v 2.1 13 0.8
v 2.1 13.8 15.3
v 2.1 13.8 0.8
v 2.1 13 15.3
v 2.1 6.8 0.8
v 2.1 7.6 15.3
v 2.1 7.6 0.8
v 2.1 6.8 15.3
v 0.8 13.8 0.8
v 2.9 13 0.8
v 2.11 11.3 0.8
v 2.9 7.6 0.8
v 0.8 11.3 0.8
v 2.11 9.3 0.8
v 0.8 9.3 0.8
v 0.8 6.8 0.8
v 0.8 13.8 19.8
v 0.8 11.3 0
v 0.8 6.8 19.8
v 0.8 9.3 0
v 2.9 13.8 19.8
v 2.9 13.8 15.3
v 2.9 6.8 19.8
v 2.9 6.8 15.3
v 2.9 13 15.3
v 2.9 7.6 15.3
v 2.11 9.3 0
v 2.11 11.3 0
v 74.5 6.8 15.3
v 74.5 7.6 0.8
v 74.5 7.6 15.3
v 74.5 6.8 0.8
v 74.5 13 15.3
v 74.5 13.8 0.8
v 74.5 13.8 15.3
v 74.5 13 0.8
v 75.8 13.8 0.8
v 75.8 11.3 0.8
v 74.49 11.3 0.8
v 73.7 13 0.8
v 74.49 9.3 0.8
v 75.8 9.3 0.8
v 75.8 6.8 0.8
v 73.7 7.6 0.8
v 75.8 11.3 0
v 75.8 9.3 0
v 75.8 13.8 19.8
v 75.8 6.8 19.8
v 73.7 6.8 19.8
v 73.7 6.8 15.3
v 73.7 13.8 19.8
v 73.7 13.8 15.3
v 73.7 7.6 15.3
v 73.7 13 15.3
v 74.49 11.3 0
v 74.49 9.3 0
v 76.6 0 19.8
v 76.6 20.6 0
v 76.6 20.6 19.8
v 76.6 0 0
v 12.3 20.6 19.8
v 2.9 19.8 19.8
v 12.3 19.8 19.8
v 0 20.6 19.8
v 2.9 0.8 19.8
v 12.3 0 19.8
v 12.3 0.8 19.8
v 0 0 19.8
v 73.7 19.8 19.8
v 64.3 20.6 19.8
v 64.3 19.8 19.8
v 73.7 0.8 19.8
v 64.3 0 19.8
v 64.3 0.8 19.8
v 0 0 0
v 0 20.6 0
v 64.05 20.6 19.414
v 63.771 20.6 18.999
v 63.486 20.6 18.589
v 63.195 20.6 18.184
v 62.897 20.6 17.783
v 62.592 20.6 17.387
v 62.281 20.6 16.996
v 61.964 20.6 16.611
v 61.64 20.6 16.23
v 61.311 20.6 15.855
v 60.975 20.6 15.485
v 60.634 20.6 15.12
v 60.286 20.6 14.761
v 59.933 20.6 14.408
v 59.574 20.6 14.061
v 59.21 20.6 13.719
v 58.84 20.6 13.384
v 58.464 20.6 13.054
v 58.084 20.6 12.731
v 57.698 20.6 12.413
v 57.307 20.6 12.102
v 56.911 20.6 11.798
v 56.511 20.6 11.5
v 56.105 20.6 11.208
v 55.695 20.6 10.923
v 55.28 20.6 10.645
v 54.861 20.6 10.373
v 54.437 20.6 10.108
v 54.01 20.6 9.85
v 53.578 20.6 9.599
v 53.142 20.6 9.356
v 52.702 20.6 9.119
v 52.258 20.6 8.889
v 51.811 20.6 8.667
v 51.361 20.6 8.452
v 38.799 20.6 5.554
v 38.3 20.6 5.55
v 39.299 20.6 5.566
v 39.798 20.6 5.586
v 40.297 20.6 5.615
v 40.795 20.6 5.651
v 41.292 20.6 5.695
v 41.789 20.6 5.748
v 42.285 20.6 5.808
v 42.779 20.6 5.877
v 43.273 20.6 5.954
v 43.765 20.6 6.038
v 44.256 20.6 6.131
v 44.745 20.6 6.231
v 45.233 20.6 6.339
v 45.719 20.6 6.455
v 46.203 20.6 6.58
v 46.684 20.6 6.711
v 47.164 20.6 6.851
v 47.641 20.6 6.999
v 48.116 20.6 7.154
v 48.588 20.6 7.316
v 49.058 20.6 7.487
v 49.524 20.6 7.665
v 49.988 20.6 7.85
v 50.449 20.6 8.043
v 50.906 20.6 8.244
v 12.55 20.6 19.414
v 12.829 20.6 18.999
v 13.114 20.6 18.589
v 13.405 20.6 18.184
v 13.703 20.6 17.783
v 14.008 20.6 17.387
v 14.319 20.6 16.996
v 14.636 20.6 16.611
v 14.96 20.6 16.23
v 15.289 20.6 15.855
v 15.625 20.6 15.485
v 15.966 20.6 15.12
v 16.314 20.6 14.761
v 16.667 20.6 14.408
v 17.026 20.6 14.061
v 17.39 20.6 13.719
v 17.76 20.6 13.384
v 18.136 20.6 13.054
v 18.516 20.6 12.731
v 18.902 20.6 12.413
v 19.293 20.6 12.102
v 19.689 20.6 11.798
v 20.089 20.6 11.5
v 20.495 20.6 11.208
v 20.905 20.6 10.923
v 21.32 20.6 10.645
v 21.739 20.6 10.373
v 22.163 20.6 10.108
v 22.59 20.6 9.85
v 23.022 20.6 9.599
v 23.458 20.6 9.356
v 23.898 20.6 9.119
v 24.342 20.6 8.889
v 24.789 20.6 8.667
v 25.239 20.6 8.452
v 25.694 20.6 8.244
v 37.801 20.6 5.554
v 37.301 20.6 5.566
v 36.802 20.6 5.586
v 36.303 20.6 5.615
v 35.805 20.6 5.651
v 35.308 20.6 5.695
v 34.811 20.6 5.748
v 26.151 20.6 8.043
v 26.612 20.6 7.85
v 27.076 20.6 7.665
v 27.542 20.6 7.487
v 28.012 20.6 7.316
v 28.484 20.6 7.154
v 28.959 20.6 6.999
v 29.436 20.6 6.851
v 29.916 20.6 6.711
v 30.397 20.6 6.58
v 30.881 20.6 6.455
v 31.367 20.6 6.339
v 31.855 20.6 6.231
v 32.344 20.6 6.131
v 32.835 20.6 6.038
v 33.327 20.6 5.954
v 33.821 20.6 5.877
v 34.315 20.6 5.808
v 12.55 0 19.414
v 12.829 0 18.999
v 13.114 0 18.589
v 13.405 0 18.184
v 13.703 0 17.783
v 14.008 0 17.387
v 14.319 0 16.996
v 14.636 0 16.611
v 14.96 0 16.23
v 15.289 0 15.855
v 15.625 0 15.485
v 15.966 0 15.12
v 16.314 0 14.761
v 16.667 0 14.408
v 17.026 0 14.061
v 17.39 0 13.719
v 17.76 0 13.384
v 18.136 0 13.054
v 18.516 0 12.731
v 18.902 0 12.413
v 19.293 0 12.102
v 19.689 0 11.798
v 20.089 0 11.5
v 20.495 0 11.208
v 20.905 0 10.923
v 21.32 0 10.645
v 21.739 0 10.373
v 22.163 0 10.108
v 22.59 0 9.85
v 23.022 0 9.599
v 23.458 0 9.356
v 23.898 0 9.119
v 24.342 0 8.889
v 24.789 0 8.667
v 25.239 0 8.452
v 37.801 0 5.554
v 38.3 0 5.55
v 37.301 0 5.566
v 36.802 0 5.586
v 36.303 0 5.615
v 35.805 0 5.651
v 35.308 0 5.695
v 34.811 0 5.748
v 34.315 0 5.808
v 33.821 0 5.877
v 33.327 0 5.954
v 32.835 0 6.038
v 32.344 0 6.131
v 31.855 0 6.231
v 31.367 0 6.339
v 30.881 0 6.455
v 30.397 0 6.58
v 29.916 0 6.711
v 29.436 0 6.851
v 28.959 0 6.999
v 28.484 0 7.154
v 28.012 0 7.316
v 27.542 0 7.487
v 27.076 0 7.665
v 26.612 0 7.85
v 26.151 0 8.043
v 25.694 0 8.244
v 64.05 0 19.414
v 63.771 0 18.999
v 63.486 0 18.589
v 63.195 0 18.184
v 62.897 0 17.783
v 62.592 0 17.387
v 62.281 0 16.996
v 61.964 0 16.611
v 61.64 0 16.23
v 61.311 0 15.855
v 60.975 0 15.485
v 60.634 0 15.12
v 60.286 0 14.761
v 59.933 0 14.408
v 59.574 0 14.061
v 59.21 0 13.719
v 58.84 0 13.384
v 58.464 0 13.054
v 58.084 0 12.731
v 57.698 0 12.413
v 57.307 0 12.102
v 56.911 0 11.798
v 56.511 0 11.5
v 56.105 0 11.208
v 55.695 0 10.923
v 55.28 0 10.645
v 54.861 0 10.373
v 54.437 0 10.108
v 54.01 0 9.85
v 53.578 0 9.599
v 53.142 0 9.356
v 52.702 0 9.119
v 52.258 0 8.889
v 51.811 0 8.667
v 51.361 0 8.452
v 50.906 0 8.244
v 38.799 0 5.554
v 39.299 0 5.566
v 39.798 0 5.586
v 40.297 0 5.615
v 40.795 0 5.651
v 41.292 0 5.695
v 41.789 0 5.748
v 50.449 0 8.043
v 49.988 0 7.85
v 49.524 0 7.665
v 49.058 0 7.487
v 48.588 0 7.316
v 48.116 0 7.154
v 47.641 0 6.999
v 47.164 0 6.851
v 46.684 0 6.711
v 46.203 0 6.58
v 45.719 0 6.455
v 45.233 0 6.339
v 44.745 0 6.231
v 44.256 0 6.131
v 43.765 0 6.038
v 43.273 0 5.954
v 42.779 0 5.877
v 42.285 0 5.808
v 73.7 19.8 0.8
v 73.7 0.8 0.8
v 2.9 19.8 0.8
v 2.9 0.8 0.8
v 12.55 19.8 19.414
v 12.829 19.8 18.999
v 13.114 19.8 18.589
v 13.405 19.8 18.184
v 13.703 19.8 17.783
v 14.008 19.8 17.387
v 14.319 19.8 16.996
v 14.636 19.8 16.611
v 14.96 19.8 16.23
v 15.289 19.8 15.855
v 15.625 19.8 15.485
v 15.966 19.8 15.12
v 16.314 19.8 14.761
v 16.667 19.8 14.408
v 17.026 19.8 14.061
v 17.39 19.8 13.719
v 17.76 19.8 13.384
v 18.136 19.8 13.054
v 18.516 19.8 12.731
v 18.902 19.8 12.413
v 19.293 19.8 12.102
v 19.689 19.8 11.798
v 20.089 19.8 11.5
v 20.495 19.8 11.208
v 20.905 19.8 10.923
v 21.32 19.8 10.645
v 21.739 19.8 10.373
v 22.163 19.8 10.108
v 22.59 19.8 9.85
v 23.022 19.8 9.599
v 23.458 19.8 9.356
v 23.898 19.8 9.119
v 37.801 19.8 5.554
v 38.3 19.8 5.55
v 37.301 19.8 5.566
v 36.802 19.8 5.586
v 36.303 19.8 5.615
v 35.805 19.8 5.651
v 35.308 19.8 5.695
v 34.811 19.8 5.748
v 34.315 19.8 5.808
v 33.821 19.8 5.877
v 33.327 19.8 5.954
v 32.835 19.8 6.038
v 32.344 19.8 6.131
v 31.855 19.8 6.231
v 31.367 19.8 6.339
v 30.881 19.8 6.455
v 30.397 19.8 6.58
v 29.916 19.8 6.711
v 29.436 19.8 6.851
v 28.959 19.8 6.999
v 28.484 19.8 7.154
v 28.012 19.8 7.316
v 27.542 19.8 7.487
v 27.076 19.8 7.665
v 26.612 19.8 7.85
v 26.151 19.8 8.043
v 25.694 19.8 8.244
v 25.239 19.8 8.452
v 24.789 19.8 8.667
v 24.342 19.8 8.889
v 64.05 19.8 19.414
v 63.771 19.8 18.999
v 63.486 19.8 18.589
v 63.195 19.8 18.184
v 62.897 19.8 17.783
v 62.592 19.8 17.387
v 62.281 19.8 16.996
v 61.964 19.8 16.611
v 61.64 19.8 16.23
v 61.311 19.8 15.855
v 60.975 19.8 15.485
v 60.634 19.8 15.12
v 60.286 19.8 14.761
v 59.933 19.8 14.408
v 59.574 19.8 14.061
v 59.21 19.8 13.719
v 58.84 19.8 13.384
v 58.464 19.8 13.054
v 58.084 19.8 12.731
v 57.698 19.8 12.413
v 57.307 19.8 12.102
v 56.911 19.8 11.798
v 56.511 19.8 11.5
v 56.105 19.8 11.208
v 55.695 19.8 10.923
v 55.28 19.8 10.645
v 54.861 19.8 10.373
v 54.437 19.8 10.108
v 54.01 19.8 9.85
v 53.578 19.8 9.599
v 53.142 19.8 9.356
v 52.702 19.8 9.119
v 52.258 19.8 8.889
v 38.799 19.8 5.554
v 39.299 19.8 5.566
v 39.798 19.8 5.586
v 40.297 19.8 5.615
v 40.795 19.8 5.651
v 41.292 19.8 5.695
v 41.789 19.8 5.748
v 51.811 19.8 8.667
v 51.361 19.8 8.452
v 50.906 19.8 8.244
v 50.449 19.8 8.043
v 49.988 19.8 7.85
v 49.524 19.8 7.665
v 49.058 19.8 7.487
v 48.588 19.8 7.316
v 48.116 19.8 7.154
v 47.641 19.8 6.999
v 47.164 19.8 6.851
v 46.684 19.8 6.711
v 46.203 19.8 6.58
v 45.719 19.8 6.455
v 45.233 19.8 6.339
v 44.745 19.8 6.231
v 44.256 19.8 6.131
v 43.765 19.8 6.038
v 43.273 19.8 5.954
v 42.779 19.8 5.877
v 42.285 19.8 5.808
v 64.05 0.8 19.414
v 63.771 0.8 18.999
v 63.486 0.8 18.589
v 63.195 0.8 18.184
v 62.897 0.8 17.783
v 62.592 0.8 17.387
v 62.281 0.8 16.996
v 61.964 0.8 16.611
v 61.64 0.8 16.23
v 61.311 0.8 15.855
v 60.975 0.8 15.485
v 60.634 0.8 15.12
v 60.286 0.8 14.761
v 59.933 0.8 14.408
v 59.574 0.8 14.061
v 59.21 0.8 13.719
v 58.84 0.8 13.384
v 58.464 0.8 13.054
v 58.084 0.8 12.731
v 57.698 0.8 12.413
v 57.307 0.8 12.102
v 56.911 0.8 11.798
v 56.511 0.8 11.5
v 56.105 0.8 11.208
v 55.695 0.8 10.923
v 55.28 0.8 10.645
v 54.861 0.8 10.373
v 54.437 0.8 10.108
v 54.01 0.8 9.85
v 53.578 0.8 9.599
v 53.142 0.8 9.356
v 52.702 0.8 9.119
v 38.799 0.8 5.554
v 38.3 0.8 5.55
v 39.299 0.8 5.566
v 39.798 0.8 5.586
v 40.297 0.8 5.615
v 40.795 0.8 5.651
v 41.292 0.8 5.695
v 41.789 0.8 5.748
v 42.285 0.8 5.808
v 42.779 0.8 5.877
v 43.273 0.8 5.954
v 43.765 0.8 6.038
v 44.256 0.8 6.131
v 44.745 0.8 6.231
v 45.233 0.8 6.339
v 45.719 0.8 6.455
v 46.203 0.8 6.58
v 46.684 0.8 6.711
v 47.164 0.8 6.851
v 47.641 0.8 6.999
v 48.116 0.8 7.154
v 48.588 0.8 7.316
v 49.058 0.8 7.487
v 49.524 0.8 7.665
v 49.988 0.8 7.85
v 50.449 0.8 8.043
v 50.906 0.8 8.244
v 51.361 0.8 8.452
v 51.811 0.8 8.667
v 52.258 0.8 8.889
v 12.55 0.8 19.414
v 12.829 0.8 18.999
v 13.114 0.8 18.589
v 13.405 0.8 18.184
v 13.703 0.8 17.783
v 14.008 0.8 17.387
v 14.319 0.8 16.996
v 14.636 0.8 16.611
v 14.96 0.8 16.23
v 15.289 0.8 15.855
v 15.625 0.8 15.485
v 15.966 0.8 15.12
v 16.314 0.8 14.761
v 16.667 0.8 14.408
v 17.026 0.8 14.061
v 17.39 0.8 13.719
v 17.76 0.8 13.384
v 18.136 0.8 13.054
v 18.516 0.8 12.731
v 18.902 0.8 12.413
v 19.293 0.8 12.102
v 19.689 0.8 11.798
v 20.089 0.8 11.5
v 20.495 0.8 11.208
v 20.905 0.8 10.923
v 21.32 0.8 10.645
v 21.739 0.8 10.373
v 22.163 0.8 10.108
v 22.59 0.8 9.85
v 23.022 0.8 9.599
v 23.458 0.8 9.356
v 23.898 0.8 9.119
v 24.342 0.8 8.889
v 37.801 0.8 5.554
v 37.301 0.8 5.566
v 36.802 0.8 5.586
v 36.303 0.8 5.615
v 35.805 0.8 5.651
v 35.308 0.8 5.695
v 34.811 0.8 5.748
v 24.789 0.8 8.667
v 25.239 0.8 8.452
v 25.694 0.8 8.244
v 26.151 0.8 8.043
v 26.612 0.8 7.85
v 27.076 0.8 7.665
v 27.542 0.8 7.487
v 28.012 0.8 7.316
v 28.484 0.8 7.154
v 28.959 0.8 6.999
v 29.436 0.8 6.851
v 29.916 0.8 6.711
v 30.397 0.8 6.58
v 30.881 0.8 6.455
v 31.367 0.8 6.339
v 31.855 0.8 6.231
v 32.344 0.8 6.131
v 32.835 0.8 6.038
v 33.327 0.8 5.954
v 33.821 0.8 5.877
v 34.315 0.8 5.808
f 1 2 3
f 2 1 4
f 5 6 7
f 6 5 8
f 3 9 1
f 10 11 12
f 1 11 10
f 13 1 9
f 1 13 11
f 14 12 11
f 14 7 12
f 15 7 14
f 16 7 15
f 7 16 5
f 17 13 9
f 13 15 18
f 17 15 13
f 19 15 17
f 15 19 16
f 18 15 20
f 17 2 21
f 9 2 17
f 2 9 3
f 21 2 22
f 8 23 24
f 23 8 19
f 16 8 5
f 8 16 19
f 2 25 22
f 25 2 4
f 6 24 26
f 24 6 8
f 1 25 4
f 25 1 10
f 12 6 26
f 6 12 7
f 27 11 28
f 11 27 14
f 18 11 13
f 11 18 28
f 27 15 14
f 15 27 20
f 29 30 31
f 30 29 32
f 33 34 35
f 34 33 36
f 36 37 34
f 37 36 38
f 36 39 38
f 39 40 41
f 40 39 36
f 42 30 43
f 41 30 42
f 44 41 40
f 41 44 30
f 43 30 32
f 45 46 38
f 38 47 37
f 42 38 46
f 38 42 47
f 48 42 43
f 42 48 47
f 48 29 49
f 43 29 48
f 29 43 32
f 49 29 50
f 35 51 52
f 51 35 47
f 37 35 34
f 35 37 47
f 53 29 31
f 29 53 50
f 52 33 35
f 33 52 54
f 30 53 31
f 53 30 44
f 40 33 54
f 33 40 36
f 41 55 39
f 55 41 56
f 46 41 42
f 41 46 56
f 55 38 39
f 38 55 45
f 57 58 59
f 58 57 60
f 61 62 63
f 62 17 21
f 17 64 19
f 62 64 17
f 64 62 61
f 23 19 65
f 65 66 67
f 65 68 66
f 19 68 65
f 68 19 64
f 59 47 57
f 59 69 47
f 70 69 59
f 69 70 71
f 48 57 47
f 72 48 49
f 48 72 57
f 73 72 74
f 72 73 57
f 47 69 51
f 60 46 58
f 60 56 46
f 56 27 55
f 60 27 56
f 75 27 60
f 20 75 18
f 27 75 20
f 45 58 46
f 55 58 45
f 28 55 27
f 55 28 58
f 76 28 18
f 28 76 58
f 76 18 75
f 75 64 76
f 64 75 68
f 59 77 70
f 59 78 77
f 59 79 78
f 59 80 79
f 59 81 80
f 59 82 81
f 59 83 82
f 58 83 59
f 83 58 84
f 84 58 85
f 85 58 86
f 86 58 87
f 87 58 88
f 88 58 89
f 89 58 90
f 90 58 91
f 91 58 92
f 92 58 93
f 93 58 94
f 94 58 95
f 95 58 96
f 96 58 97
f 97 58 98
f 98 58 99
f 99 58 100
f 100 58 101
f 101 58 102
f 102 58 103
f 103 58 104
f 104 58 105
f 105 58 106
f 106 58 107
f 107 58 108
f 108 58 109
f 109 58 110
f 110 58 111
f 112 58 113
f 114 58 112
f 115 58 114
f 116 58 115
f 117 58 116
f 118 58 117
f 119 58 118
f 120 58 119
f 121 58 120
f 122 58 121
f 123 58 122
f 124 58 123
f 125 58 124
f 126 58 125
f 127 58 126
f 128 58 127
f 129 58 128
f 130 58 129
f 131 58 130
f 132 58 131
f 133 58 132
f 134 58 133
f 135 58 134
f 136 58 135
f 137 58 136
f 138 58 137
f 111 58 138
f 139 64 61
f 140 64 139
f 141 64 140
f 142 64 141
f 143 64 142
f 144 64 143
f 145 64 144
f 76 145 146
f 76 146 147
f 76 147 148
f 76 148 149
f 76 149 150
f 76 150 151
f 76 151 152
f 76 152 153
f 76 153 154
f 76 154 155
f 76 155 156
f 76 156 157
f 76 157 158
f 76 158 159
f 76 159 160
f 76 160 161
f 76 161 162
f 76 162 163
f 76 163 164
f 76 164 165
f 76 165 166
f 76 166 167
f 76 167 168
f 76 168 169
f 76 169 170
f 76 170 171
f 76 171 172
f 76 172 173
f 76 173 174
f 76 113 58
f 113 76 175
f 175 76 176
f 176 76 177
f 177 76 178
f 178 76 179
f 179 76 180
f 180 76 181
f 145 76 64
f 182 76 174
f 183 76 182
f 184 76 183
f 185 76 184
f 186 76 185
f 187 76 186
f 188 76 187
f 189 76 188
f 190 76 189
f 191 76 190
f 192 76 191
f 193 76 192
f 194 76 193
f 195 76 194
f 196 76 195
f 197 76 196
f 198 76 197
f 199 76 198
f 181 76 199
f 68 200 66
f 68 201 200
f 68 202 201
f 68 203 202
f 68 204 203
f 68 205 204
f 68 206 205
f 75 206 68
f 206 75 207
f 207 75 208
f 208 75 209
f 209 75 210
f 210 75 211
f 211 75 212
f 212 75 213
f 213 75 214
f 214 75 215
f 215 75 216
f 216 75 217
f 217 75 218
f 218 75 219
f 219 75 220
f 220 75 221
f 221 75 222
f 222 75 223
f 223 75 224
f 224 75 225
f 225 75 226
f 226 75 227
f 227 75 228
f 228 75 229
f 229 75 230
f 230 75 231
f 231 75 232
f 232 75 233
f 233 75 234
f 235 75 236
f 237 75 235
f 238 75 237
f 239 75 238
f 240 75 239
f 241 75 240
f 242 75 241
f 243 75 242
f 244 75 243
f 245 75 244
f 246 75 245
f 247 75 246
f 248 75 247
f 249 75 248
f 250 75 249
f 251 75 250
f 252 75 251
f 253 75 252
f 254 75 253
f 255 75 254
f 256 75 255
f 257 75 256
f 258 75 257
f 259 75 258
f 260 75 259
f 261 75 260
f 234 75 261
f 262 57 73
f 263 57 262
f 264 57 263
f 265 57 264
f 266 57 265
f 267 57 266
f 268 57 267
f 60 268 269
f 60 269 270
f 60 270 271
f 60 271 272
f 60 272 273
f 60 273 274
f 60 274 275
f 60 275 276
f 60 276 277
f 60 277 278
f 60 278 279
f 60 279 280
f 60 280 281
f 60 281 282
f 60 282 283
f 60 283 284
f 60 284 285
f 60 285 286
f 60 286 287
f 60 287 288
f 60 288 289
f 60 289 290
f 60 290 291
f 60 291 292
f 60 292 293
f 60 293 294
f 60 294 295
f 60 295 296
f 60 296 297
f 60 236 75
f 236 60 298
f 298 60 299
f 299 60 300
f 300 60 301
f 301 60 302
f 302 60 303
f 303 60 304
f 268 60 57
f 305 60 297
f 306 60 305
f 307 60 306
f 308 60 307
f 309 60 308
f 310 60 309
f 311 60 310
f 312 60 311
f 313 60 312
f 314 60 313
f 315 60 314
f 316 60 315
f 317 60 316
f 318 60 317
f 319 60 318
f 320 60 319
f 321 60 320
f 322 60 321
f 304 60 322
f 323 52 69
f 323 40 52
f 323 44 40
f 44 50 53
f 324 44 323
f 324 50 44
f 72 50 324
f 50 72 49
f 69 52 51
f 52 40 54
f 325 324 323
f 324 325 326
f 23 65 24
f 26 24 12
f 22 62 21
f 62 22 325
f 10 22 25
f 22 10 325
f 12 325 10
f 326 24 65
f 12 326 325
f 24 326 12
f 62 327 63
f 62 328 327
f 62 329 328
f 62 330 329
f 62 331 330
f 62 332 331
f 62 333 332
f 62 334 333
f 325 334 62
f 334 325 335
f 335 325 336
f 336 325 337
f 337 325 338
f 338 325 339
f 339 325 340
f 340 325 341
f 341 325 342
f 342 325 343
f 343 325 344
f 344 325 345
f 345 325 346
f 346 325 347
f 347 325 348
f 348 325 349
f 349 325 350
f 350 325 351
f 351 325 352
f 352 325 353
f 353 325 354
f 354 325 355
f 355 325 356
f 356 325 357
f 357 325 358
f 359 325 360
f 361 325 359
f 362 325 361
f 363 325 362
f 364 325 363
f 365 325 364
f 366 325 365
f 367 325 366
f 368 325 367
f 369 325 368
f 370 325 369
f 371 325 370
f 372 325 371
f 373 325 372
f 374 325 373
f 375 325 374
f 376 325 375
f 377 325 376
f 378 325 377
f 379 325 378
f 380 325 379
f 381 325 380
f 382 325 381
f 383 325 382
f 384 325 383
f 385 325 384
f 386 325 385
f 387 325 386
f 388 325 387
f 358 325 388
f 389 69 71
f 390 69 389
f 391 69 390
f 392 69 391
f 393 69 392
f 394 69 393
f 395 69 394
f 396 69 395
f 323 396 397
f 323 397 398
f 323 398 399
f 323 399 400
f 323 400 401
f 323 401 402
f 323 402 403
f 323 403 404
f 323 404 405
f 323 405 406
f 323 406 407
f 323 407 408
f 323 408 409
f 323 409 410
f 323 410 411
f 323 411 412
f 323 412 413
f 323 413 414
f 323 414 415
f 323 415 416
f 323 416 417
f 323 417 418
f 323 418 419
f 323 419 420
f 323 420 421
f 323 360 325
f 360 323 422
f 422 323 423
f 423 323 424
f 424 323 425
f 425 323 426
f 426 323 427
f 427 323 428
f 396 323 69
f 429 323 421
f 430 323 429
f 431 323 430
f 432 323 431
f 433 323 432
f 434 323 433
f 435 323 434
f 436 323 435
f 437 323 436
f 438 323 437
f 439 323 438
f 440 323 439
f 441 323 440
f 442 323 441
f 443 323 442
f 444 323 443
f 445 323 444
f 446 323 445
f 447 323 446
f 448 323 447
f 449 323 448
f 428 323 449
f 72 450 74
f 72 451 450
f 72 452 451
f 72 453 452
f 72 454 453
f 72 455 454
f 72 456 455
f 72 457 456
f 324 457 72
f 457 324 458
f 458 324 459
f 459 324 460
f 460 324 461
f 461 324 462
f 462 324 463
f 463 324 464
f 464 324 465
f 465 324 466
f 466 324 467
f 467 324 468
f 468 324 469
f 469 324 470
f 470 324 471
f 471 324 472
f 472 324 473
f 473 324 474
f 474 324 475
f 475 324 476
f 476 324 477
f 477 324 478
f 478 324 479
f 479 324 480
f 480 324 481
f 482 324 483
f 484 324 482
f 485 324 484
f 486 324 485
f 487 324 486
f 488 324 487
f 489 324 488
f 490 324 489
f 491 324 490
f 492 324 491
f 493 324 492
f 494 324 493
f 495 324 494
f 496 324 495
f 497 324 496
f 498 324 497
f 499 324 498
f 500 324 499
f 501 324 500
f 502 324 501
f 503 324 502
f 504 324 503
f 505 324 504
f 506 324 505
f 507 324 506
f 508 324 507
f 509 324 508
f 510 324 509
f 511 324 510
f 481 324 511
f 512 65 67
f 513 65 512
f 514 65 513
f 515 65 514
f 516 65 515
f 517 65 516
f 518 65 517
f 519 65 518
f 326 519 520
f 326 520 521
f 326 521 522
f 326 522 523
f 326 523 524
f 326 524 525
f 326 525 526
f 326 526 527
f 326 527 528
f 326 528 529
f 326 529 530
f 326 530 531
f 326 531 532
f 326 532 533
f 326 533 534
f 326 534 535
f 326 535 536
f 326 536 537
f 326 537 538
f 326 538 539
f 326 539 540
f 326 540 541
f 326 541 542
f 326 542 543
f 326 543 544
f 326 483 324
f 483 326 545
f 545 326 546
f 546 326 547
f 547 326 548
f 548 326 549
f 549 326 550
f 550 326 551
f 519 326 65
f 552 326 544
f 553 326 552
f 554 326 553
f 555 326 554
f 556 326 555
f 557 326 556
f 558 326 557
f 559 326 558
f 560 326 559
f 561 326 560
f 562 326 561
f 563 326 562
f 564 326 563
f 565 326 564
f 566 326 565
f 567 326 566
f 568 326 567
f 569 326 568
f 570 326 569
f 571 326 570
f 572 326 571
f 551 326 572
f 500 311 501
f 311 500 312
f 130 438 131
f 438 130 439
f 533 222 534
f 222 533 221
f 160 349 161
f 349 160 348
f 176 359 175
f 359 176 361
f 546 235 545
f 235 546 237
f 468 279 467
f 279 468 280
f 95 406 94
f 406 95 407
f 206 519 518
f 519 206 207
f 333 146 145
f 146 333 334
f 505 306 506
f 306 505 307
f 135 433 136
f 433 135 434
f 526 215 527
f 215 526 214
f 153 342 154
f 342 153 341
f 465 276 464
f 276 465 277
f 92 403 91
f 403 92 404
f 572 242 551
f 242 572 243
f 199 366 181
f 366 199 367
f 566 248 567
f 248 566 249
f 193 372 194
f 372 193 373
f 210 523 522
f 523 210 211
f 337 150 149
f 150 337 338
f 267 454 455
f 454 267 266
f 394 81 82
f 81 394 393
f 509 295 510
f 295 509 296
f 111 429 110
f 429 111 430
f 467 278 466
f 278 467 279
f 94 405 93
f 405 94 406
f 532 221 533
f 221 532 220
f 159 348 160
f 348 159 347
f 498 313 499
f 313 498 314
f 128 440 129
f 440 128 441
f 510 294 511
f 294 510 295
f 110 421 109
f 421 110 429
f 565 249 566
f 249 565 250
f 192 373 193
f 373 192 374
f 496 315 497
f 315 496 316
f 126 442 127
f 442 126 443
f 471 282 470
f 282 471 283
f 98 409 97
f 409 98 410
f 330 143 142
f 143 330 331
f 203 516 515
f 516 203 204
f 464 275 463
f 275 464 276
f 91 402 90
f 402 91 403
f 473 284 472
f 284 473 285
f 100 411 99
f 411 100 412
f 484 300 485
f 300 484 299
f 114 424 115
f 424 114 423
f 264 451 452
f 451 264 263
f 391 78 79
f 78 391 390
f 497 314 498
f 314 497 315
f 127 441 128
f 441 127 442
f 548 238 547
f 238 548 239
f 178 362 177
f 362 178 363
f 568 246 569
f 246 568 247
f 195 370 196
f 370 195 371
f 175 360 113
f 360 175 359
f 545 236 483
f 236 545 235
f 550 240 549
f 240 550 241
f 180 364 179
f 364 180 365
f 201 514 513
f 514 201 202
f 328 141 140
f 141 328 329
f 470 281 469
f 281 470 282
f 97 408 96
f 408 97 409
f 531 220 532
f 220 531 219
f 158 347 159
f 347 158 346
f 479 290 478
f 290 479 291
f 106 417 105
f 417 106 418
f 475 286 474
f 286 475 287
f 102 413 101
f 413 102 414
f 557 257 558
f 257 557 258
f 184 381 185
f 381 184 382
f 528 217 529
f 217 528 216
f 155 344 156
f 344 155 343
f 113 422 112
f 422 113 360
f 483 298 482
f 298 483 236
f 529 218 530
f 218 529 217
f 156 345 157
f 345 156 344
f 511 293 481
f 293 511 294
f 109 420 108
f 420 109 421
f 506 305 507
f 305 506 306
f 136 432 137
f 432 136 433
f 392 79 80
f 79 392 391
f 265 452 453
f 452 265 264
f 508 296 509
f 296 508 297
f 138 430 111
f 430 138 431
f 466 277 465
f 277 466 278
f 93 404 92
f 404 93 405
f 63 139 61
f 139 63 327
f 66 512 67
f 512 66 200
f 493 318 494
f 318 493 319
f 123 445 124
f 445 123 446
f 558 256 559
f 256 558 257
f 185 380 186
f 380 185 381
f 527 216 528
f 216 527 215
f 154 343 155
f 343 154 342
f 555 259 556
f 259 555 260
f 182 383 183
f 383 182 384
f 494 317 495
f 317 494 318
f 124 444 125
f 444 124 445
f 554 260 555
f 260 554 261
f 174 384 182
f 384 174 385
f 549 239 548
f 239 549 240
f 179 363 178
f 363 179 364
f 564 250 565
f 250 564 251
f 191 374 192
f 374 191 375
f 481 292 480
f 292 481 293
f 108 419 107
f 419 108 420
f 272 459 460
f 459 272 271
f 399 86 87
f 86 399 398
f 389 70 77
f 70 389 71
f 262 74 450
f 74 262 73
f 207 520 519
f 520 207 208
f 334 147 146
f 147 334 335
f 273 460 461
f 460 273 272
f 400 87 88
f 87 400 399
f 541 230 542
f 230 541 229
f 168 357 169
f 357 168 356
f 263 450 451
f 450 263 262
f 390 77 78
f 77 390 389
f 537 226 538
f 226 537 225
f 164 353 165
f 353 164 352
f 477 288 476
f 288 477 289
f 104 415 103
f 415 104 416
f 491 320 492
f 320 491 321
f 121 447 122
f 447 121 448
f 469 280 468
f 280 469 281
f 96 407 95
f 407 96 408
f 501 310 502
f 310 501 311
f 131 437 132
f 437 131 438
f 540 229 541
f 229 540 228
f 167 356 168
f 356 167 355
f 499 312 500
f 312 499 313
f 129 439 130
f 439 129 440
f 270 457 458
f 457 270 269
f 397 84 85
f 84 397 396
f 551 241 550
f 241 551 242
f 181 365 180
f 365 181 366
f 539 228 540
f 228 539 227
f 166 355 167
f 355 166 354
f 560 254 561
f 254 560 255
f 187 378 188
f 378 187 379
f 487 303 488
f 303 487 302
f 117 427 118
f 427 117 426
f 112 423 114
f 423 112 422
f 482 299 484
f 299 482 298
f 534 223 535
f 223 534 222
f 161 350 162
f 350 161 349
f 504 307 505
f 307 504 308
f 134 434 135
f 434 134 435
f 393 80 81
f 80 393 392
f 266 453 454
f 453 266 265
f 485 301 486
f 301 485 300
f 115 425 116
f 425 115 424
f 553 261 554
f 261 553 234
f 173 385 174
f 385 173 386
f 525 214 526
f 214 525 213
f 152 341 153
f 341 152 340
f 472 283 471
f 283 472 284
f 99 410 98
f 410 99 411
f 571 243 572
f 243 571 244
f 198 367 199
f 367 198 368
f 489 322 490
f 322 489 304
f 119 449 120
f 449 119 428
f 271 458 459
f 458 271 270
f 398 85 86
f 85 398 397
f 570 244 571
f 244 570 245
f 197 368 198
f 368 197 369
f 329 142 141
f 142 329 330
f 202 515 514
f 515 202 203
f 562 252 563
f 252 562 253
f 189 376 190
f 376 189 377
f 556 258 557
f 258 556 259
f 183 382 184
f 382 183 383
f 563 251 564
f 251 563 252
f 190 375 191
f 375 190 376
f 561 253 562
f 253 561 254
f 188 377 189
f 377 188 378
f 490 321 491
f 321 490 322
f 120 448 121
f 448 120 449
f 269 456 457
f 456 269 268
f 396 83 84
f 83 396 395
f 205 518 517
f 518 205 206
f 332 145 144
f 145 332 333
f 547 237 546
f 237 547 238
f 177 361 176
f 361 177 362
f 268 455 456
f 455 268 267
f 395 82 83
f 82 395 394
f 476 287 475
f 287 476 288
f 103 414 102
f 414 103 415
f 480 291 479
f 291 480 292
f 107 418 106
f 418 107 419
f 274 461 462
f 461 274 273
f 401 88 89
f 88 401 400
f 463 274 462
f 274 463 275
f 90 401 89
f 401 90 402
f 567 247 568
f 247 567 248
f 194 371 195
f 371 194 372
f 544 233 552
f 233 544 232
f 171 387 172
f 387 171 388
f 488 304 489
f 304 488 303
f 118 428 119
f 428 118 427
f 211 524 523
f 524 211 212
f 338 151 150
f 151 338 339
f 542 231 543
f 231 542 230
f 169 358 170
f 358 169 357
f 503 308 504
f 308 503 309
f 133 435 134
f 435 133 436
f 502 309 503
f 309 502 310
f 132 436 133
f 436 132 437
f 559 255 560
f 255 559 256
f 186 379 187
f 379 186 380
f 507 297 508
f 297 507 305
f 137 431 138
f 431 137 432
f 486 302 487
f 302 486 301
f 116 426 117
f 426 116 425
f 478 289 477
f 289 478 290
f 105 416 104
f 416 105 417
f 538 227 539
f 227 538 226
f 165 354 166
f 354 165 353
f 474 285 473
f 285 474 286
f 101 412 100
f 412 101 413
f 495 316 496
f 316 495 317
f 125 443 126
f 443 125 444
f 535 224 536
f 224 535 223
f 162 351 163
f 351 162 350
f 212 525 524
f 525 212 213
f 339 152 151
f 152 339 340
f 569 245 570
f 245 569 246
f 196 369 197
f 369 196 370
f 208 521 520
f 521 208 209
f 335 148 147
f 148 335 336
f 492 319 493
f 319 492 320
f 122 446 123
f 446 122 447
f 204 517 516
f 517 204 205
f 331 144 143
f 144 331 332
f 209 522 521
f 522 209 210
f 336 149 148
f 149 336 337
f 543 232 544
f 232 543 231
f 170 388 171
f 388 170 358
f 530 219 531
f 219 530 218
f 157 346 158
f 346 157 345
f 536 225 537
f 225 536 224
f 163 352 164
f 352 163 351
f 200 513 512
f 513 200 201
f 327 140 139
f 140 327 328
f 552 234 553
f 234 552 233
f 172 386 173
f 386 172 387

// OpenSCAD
battery_d=19;
battery_l=65;
spring_depth=5;
spring_thickness=1.3;
spring_width=7;
spring_height=14.5;
pcb_mount=true;
pin_w=2;
pin_l=5;
wall=0.8;
bottom=0.8;
channel=3;
cover_screw=3;
insert_depth=6;
box_width=23;
jack_d=12;
arc_depth=0.75*battery_d;
arc_width=0.8*battery_l;
arc_r=(arc_width^2+4*arc_depth^2)/arc_depth/8;
bsl=1/100;
$fa=1/2;
$fs=1/2;

function distributor(start,end, distance)=let(offset=((end-start)%distance)/2)[for (x=[start+offset+distance/2:distance:end-distance/2]) x];

module spring_cutout(sd,st,sw,sh,bd,w,pw,pl,pm) {
  cutout=(bd-sh)/2;
  spring_sink=pm?cutout:0;
  translate([0,-sw/2,cutout-spring_sink])cube([st,sw,bd-cutout+spring_sink]);
  translate([0,-sw/2,bd-cutout-spring_sink])cube([st+wall+bsl,sw,cutout+bsl+spring_sink]);
  translate([0,-sw/2+w,0])cube([st+wall+bsl,sw-2*w,bd+bsl]);
  if(pm)translate([0,-pw/2,-pl])cube([st+bsl,pw,pl+bsl]);
}

module single_cell(bd,bl,sd,st,sw,sh,w,b,pl,pw,pm) {
  difference() {
    cube([bl+2*sd+2*w,bd+2*w,bd+b]);
    translate([w+st+w,w,b]) cube([bl+2*sd-2*st-2*w,bd,bd+bsl]);
    translate([w,w+bd/2,b])spring_cutout(sd=sd,st=st,sw=sw,sh=sh,bd=bd,w=w,pw=pw,pl=pw,pm=pm);
    translate([bl+2*sd+w,w+bd/2,b])rotate([0,0,180])spring_cutout(sd=sd,st=st,sw=sw,sh=sh,bd=bd,w=w,pw=pw,pl=pw,pm=pm);
    translate([bl/2+sd+w,-bsl,bd+b+arc_r-arc_depth])rotate([-90,0,0])cylinder(r=arc_r,h=bd+2*w+2*bsl);
  }
}

module screw_mount(wall,d,height) {
  difference() {
    translate([0,0,-2*height])cube([d+wall,d+wall,height*2]);
    translate([(d+wall),(d+wall),-height]) rotate([0,135,45])translate([0,-2*height])cube([height*4,height*4,height*4]);
    translate([d/2,d/2,-height]) cylinder(d=d,h=height+bsl);
  }
}

module switch_hole() {
circle(d=6.5);
/*
  square([8,4],center=true);
  translate([-7.5,0]) circle(d=3);
  translate([7.5,0]) circle(d=3);
  */
}

module box(width,depth,height,wall,bottom,insert_d,insert_h) {
  difference() {
    translate([0,-width-wall,0]) cube([depth+2*wall,width+wall,height+bottom]);
    translate([wall,-width,bottom]) cube([depth,width+bsl,height+bsl]);
    translate([-bsl,-width/2,bottom+height/2])rotate([0,90,0])linear_extrude(height=wall+2*bsl) switch_hole();
    for (tr=distributor(wall+16,wall+depth,16)) translate([tr,-width+bsl,bottom+height/2]) rotate([90,0,0]) intersection() {
  cylinder(d=jack_d,h=wall+2*bsl);
  translate([-10.5/2,-jack_d/2,0]) cube([10.5,jack_d,wall+2*bsl]);
  }
  }
  translate([wall,0,height+bottom])rotate([0,0,-90]) screw_mount(wall=wall,d=insert_d,height=insert_h);
  translate([wall,-width,height+bottom])rotate([0,0,0]) screw_mount(wall=wall,d=insert_d,height=insert_h);
  translate([wall+depth,0,height+bottom])rotate([0,0,180]) screw_mount(wall=wall,d=insert_d,height=insert_h);
  translate([wall+depth,-width,height+bottom])rotate([0,0,90]) screw_mount(wall=wall,d=insert_d,height=insert_h);
}

module double_battery_holder(bd,bl,sd,st,sw,sh,w,b,c,ih,id) {
  difference() {
    union() {
      single_cell(bd=bd,bl=bl,sd=sd,st=st,sw=sw,sh=sh,w=w,b=b);
      translate([0,bd+w,0])single_cell(bd=bd,bl=bl,sd=sd,st=st,sw=sw,sh=sh,w=w,b=b);
      box(width=box_width,depth=bl+2*sd,height=bd,wall=w,bottom=b,insert_d=id,insert_h=ih);
    }
    for (tr=[[w+st+w+c/2,w/2,b+c/2],
              [w+st+w+c/2,w/2,b+c/2+w+c],
              [w+st+w+c/2,w/2+bd+w,b+c/2],
              [w+st+w+c/2+bl+2*sd-2*st-2*w-c,w/2+bd+w,b+c/2],
             ]) translate(tr) rotate([-90,0,0])cylinder(d=c,h=w+bsl,center=true);
    for (x=distributor(w,w+bl+2*sd,20))
    for (y=distributor(-box_width-w,bd*2+3*w,20))
    translate([x,y,-bsl]) cylinder(d1=5,d2=5+2*b,h=b+2*bsl);
  }
}

//double_battery_holder(bd=battery_d,bl=battery_l,sd=spring_depth,st=spring_thickness,sw=spring_width,sh=spring_height,w=wall,b=bottom,c=channel,ih=insert_depth,id=cover_screw);
single_cell(bd=battery_d,bl=battery_l,sd=spring_depth,st=spring_thickness,sw=spring_width,sh=spring_height,w=wall,b=bottom,pw=pin_w,pl=pin_l,pm=pcb_mount);
//spring_cutout(bd=battery_d,sd=spring_depth,st=spring_thickness,sw=spring_width,sh=spring_height,w=wall,pw=pin_w,pl=pin_l);
